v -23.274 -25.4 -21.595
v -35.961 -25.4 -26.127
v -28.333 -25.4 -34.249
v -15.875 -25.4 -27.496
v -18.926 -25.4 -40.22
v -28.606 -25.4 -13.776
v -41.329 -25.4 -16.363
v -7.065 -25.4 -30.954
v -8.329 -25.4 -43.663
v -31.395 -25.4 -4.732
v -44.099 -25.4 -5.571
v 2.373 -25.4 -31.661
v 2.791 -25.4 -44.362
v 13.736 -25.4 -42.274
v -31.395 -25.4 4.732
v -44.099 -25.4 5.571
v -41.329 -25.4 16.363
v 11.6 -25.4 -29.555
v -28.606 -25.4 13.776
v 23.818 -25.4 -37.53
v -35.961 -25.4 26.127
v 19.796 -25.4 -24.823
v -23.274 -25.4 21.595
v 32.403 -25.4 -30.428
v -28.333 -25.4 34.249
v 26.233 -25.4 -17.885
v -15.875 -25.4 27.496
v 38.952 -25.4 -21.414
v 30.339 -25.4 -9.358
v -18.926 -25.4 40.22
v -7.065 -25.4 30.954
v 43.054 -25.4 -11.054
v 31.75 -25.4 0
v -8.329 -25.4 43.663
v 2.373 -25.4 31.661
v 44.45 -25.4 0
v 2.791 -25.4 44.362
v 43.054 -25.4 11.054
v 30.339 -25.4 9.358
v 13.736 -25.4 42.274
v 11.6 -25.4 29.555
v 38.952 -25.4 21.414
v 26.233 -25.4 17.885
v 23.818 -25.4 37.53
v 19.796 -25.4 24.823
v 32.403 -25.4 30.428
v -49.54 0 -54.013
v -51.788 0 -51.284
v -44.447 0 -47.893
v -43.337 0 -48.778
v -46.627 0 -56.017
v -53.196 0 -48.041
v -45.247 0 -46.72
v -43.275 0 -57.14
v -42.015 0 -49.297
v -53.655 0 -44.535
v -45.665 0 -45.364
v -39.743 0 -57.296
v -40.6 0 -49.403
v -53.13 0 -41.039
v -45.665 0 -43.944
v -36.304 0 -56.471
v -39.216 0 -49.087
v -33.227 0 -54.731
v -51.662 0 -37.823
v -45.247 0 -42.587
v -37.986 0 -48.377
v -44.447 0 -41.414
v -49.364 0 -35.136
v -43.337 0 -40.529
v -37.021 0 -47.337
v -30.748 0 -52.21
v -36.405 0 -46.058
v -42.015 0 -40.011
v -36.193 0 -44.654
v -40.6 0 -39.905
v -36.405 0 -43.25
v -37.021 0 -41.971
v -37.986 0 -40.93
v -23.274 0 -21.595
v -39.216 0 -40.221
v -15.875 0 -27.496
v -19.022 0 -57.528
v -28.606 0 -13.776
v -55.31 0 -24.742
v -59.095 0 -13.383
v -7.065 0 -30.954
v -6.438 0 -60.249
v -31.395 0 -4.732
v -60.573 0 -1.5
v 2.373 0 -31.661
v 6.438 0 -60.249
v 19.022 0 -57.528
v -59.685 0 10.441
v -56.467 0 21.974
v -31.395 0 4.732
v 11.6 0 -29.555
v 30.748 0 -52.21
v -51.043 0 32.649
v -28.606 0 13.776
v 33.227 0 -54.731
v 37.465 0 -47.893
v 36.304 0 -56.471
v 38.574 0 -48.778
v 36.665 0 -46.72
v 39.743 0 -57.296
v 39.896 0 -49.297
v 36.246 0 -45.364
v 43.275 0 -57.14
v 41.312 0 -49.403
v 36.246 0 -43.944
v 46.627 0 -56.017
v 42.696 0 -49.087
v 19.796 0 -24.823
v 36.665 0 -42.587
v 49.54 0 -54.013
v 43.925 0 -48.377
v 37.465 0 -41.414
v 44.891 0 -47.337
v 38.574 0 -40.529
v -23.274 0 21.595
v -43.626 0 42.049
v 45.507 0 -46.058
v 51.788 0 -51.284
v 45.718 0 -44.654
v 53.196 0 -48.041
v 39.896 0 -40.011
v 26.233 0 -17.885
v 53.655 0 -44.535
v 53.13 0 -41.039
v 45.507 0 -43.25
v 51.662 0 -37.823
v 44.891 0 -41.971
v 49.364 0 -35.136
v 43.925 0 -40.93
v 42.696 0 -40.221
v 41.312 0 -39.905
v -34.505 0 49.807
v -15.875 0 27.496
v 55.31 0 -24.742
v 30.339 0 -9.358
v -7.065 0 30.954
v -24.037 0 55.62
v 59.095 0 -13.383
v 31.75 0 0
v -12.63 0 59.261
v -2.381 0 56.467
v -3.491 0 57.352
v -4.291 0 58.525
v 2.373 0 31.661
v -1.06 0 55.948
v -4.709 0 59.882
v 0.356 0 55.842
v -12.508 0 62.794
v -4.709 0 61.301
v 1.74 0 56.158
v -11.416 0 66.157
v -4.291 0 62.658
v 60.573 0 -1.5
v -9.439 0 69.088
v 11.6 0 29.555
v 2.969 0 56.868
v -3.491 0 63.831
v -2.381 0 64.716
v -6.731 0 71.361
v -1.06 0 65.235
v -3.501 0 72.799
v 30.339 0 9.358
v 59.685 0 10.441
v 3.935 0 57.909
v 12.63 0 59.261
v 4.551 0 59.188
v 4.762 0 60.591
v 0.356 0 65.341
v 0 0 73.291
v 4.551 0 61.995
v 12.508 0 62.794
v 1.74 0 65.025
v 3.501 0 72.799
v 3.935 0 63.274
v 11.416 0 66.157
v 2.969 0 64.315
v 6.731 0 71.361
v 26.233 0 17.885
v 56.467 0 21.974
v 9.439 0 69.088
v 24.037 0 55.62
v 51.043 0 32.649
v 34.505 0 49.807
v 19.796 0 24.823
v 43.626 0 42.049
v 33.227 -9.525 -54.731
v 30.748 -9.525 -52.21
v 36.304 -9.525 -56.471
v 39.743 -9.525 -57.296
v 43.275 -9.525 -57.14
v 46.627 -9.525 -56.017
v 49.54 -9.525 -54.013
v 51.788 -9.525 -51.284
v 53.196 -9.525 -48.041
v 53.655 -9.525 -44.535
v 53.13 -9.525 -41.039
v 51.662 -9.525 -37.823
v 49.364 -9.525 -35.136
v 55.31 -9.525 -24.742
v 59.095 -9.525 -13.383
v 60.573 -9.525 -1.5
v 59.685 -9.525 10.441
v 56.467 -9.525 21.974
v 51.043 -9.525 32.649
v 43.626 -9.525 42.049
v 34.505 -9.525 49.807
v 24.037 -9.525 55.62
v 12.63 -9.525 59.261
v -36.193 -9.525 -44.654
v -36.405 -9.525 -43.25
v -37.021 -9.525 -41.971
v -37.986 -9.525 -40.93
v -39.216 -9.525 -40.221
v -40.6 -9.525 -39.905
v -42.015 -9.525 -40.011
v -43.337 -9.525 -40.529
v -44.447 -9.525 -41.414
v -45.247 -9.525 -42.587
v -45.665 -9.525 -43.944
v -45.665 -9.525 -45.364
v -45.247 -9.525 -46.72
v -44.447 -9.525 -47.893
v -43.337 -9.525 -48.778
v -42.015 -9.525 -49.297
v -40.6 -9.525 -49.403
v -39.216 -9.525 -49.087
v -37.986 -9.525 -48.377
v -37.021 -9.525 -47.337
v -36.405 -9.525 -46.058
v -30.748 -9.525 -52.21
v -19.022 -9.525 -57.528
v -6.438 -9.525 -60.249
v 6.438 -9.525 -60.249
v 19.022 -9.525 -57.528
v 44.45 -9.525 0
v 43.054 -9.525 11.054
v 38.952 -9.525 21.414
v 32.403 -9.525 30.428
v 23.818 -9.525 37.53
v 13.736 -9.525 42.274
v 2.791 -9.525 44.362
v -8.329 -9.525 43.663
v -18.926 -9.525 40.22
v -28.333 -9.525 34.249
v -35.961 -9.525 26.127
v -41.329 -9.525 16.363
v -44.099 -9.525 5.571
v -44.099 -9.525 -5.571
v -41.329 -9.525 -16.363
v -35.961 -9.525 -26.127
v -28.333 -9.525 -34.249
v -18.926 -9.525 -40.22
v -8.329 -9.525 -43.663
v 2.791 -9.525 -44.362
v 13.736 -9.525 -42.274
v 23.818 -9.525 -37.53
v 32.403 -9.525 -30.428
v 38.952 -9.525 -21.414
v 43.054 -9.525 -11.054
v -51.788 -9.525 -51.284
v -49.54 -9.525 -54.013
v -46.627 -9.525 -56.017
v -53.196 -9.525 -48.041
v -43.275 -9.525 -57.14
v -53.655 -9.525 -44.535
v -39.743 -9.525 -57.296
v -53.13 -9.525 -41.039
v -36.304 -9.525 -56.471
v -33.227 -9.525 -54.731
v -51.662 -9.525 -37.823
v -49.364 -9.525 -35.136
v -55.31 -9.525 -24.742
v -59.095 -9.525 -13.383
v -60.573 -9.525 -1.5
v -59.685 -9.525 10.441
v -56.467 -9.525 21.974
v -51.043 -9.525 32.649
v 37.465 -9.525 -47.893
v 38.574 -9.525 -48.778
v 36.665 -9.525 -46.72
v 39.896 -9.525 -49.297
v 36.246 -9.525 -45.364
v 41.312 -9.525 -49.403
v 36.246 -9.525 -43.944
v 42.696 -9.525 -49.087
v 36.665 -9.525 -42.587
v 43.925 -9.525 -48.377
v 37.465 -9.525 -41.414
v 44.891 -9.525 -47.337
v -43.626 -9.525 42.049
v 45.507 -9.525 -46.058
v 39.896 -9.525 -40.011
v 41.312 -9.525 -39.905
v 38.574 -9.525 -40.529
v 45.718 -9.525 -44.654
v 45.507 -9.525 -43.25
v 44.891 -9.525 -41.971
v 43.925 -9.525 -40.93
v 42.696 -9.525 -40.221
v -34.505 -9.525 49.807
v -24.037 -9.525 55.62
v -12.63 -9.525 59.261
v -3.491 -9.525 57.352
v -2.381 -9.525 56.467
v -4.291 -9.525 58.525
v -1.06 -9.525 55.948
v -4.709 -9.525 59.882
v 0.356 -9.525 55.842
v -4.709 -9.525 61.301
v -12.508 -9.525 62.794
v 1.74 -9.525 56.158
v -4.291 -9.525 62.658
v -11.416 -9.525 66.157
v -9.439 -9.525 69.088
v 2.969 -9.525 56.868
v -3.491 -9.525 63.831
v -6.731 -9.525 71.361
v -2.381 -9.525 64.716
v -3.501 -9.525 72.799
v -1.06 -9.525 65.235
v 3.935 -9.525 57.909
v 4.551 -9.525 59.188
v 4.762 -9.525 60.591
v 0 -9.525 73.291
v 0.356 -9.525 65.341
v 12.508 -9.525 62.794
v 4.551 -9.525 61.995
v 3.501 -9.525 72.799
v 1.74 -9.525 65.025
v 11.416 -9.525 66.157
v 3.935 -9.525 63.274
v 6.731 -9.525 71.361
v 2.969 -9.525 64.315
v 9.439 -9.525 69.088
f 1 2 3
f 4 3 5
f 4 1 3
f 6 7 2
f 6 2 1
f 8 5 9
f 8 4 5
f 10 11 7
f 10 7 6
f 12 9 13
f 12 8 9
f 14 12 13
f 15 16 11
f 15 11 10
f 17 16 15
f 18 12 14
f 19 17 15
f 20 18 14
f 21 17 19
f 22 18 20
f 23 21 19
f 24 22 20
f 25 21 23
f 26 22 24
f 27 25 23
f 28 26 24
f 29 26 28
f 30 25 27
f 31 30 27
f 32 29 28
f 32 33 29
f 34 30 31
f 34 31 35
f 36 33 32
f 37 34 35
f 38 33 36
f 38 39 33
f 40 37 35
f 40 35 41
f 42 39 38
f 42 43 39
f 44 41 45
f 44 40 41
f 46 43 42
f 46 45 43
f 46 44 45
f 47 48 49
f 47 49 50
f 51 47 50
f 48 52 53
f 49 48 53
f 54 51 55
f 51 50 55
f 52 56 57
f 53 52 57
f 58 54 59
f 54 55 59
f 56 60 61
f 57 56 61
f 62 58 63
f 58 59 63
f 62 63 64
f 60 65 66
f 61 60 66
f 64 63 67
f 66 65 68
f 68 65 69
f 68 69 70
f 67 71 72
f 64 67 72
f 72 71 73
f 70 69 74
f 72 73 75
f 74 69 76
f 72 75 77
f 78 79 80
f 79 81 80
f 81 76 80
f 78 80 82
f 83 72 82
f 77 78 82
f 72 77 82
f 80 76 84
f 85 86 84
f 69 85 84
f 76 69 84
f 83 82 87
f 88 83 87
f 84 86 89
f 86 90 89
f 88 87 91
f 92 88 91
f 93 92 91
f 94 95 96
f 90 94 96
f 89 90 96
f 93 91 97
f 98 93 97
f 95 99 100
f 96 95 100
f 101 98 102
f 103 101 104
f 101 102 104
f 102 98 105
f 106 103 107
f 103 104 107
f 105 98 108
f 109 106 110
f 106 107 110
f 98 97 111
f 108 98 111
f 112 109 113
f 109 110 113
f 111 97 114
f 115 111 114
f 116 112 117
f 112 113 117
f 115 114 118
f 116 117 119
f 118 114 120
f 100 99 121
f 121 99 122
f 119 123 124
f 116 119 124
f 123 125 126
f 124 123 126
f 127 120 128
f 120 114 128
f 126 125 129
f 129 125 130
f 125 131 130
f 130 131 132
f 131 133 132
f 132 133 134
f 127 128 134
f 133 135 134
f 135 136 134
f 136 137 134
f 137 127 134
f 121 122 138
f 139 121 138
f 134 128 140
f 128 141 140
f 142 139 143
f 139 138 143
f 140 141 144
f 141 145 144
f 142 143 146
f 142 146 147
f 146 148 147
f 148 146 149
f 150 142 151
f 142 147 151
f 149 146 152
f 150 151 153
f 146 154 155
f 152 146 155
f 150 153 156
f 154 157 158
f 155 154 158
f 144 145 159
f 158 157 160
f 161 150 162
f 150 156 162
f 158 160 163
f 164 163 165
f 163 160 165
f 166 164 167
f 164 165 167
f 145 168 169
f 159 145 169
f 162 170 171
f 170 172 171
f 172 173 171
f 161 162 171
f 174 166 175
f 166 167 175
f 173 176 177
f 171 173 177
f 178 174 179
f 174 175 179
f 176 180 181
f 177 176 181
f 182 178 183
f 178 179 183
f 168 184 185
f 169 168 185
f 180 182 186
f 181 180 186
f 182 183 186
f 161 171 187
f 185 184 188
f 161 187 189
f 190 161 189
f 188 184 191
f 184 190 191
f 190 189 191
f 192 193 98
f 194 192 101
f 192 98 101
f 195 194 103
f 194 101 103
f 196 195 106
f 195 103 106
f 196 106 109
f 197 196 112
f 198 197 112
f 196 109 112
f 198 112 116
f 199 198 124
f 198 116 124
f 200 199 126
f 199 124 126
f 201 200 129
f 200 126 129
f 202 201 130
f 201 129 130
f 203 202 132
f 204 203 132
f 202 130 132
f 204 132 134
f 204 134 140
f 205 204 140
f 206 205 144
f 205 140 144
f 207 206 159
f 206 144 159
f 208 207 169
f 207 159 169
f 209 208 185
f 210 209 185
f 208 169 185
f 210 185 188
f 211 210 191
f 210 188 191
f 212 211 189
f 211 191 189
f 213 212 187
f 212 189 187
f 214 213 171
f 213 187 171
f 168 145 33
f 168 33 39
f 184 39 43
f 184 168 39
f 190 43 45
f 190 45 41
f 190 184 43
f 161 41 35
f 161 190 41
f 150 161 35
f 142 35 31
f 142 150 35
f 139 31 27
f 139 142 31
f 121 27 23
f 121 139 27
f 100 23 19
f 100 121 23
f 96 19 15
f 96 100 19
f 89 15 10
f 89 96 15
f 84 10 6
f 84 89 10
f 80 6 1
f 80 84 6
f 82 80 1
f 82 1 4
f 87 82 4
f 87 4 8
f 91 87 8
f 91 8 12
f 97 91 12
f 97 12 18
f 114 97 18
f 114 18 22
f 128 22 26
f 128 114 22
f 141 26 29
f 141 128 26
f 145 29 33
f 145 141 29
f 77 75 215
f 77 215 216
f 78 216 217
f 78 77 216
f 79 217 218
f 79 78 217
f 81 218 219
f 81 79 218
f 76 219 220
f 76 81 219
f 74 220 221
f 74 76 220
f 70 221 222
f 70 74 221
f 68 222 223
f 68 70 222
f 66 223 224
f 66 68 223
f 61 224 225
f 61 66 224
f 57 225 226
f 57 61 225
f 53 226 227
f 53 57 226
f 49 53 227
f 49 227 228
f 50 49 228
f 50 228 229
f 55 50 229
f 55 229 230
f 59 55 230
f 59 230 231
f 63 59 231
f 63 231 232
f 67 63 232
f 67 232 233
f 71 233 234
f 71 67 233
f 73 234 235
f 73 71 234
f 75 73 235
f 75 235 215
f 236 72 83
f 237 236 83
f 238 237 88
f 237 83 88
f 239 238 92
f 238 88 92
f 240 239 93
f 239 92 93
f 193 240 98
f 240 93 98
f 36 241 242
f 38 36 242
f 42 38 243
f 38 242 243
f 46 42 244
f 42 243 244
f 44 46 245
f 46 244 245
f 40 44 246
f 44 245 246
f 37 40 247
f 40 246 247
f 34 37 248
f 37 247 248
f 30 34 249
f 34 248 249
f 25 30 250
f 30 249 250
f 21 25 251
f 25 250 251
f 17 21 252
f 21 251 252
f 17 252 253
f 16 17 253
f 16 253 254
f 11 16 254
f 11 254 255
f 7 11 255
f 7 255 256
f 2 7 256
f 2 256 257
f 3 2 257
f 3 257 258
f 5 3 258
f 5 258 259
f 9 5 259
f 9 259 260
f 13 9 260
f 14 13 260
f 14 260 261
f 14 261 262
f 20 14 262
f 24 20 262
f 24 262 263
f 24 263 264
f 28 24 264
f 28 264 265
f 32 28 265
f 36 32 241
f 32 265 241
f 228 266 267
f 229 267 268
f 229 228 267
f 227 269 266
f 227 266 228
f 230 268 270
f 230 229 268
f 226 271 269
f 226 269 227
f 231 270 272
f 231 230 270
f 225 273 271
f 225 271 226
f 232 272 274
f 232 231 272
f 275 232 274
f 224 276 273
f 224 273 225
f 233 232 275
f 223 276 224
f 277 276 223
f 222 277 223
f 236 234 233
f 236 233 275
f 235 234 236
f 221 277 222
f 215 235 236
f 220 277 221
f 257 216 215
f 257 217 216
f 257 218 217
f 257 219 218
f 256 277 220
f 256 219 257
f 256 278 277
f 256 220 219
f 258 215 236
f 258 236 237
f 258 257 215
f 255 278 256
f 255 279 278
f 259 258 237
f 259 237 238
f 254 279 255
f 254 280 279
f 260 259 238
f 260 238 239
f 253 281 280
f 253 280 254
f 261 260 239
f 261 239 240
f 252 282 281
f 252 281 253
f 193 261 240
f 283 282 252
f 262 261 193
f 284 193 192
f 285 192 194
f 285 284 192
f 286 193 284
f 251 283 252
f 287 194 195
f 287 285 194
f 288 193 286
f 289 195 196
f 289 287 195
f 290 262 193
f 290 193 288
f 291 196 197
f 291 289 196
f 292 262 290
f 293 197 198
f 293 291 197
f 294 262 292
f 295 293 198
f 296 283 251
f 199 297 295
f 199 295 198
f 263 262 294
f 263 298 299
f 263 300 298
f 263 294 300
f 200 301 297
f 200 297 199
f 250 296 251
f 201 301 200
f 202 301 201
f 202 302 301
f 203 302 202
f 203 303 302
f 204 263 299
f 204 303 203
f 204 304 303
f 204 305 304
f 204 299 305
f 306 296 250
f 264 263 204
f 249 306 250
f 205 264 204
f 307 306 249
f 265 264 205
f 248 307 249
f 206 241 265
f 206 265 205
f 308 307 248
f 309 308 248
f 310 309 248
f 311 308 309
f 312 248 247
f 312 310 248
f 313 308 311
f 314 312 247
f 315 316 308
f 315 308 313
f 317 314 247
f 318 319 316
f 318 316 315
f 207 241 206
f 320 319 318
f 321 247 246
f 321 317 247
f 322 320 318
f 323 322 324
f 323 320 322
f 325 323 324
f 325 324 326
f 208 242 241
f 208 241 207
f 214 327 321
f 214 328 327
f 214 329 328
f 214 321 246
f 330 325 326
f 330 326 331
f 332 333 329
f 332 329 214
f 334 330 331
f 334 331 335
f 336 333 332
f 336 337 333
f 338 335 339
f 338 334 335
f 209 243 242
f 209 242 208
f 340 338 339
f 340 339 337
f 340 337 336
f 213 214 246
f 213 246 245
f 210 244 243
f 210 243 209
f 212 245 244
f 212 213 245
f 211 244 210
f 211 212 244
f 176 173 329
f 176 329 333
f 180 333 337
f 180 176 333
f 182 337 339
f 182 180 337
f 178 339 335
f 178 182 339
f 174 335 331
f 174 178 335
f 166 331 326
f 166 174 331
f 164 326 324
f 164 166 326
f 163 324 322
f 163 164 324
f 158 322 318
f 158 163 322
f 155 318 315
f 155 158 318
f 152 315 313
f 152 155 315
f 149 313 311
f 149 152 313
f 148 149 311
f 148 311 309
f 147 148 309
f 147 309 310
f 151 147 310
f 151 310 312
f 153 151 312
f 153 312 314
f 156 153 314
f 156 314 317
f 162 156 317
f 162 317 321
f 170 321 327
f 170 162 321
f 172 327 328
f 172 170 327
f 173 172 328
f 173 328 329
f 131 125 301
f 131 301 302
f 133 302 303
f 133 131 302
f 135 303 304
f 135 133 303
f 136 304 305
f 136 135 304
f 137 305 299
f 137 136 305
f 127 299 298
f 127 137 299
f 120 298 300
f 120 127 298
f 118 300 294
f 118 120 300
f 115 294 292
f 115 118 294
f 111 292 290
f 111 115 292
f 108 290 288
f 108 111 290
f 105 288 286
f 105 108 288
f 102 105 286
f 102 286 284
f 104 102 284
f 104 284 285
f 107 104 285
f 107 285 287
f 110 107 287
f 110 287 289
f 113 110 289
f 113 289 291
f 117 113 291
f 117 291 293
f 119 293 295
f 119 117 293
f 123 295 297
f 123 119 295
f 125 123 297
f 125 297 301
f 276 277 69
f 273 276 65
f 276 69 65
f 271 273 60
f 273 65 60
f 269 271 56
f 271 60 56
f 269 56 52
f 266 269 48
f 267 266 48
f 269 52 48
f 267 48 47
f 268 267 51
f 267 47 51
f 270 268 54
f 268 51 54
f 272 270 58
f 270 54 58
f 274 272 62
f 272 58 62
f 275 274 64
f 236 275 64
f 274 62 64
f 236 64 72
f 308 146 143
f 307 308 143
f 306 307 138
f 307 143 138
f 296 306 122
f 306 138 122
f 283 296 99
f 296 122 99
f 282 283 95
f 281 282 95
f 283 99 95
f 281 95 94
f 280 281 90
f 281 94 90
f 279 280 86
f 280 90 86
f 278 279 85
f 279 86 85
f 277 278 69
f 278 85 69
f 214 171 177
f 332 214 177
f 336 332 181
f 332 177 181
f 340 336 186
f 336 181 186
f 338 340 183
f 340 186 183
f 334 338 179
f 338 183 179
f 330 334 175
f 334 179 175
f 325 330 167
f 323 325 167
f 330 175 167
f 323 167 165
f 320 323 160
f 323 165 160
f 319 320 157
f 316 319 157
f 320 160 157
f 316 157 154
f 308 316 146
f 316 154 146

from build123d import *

# Parameters (mm, degrees)
F0_R     = 44.45
F0_R_2   = 31.75
F1_DEPTH = 25.4
F0_R_3   = 4.7625
F2_DEPTH = 9.525


with BuildPart() as f1:
    # F0 (on Front) → F1 (new body)
    with BuildSketch(Plane.XZ):
        Circle(F0_R)
        Circle(F0_R_2, mode=Mode.SUBTRACT)
    extrude(amount=F1_DEPTH)

    # F0 (on Front) → F2 (join)
    with BuildSketch(Plane.XZ):
        with BuildLine():
            ThreePointArc((30.748129, -52.209978), (49.540006, -54.013248), (49.363954, -35.135869))
            ThreePointArc((49.363954, -35.135869), (56.466669, 21.973723), (12.630065, 59.260532))
            ThreePointArc((12.630065, 59.260532), (0, 73.291495), (-12.630065, 59.260532))
            ThreePointArc((-12.630065, 59.260532), (-56.466669, 21.973723), (-49.363954, -35.135869))
            ThreePointArc((-49.363954, -35.135869), (-49.540006, -54.013248), (-30.748129, -52.209978))
            ThreePointArc((-30.748129, -52.209978), (0, -60.591495), (30.748129, -52.209978))
        make_face()
        with Locations((-40.95568, -44.653796)):
            Circle(F0_R_3, mode=Mode.SUBTRACT)
        Circle(F0_R, mode=Mode.SUBTRACT)
        with Locations((40.95568, -44.653796)):
            Circle(F0_R_3, mode=Mode.SUBTRACT)
        with Locations((0, 60.591495)):
            Circle(F0_R_3, mode=Mode.SUBTRACT)
    extrude(amount=F2_DEPTH)


solid = f1.part
